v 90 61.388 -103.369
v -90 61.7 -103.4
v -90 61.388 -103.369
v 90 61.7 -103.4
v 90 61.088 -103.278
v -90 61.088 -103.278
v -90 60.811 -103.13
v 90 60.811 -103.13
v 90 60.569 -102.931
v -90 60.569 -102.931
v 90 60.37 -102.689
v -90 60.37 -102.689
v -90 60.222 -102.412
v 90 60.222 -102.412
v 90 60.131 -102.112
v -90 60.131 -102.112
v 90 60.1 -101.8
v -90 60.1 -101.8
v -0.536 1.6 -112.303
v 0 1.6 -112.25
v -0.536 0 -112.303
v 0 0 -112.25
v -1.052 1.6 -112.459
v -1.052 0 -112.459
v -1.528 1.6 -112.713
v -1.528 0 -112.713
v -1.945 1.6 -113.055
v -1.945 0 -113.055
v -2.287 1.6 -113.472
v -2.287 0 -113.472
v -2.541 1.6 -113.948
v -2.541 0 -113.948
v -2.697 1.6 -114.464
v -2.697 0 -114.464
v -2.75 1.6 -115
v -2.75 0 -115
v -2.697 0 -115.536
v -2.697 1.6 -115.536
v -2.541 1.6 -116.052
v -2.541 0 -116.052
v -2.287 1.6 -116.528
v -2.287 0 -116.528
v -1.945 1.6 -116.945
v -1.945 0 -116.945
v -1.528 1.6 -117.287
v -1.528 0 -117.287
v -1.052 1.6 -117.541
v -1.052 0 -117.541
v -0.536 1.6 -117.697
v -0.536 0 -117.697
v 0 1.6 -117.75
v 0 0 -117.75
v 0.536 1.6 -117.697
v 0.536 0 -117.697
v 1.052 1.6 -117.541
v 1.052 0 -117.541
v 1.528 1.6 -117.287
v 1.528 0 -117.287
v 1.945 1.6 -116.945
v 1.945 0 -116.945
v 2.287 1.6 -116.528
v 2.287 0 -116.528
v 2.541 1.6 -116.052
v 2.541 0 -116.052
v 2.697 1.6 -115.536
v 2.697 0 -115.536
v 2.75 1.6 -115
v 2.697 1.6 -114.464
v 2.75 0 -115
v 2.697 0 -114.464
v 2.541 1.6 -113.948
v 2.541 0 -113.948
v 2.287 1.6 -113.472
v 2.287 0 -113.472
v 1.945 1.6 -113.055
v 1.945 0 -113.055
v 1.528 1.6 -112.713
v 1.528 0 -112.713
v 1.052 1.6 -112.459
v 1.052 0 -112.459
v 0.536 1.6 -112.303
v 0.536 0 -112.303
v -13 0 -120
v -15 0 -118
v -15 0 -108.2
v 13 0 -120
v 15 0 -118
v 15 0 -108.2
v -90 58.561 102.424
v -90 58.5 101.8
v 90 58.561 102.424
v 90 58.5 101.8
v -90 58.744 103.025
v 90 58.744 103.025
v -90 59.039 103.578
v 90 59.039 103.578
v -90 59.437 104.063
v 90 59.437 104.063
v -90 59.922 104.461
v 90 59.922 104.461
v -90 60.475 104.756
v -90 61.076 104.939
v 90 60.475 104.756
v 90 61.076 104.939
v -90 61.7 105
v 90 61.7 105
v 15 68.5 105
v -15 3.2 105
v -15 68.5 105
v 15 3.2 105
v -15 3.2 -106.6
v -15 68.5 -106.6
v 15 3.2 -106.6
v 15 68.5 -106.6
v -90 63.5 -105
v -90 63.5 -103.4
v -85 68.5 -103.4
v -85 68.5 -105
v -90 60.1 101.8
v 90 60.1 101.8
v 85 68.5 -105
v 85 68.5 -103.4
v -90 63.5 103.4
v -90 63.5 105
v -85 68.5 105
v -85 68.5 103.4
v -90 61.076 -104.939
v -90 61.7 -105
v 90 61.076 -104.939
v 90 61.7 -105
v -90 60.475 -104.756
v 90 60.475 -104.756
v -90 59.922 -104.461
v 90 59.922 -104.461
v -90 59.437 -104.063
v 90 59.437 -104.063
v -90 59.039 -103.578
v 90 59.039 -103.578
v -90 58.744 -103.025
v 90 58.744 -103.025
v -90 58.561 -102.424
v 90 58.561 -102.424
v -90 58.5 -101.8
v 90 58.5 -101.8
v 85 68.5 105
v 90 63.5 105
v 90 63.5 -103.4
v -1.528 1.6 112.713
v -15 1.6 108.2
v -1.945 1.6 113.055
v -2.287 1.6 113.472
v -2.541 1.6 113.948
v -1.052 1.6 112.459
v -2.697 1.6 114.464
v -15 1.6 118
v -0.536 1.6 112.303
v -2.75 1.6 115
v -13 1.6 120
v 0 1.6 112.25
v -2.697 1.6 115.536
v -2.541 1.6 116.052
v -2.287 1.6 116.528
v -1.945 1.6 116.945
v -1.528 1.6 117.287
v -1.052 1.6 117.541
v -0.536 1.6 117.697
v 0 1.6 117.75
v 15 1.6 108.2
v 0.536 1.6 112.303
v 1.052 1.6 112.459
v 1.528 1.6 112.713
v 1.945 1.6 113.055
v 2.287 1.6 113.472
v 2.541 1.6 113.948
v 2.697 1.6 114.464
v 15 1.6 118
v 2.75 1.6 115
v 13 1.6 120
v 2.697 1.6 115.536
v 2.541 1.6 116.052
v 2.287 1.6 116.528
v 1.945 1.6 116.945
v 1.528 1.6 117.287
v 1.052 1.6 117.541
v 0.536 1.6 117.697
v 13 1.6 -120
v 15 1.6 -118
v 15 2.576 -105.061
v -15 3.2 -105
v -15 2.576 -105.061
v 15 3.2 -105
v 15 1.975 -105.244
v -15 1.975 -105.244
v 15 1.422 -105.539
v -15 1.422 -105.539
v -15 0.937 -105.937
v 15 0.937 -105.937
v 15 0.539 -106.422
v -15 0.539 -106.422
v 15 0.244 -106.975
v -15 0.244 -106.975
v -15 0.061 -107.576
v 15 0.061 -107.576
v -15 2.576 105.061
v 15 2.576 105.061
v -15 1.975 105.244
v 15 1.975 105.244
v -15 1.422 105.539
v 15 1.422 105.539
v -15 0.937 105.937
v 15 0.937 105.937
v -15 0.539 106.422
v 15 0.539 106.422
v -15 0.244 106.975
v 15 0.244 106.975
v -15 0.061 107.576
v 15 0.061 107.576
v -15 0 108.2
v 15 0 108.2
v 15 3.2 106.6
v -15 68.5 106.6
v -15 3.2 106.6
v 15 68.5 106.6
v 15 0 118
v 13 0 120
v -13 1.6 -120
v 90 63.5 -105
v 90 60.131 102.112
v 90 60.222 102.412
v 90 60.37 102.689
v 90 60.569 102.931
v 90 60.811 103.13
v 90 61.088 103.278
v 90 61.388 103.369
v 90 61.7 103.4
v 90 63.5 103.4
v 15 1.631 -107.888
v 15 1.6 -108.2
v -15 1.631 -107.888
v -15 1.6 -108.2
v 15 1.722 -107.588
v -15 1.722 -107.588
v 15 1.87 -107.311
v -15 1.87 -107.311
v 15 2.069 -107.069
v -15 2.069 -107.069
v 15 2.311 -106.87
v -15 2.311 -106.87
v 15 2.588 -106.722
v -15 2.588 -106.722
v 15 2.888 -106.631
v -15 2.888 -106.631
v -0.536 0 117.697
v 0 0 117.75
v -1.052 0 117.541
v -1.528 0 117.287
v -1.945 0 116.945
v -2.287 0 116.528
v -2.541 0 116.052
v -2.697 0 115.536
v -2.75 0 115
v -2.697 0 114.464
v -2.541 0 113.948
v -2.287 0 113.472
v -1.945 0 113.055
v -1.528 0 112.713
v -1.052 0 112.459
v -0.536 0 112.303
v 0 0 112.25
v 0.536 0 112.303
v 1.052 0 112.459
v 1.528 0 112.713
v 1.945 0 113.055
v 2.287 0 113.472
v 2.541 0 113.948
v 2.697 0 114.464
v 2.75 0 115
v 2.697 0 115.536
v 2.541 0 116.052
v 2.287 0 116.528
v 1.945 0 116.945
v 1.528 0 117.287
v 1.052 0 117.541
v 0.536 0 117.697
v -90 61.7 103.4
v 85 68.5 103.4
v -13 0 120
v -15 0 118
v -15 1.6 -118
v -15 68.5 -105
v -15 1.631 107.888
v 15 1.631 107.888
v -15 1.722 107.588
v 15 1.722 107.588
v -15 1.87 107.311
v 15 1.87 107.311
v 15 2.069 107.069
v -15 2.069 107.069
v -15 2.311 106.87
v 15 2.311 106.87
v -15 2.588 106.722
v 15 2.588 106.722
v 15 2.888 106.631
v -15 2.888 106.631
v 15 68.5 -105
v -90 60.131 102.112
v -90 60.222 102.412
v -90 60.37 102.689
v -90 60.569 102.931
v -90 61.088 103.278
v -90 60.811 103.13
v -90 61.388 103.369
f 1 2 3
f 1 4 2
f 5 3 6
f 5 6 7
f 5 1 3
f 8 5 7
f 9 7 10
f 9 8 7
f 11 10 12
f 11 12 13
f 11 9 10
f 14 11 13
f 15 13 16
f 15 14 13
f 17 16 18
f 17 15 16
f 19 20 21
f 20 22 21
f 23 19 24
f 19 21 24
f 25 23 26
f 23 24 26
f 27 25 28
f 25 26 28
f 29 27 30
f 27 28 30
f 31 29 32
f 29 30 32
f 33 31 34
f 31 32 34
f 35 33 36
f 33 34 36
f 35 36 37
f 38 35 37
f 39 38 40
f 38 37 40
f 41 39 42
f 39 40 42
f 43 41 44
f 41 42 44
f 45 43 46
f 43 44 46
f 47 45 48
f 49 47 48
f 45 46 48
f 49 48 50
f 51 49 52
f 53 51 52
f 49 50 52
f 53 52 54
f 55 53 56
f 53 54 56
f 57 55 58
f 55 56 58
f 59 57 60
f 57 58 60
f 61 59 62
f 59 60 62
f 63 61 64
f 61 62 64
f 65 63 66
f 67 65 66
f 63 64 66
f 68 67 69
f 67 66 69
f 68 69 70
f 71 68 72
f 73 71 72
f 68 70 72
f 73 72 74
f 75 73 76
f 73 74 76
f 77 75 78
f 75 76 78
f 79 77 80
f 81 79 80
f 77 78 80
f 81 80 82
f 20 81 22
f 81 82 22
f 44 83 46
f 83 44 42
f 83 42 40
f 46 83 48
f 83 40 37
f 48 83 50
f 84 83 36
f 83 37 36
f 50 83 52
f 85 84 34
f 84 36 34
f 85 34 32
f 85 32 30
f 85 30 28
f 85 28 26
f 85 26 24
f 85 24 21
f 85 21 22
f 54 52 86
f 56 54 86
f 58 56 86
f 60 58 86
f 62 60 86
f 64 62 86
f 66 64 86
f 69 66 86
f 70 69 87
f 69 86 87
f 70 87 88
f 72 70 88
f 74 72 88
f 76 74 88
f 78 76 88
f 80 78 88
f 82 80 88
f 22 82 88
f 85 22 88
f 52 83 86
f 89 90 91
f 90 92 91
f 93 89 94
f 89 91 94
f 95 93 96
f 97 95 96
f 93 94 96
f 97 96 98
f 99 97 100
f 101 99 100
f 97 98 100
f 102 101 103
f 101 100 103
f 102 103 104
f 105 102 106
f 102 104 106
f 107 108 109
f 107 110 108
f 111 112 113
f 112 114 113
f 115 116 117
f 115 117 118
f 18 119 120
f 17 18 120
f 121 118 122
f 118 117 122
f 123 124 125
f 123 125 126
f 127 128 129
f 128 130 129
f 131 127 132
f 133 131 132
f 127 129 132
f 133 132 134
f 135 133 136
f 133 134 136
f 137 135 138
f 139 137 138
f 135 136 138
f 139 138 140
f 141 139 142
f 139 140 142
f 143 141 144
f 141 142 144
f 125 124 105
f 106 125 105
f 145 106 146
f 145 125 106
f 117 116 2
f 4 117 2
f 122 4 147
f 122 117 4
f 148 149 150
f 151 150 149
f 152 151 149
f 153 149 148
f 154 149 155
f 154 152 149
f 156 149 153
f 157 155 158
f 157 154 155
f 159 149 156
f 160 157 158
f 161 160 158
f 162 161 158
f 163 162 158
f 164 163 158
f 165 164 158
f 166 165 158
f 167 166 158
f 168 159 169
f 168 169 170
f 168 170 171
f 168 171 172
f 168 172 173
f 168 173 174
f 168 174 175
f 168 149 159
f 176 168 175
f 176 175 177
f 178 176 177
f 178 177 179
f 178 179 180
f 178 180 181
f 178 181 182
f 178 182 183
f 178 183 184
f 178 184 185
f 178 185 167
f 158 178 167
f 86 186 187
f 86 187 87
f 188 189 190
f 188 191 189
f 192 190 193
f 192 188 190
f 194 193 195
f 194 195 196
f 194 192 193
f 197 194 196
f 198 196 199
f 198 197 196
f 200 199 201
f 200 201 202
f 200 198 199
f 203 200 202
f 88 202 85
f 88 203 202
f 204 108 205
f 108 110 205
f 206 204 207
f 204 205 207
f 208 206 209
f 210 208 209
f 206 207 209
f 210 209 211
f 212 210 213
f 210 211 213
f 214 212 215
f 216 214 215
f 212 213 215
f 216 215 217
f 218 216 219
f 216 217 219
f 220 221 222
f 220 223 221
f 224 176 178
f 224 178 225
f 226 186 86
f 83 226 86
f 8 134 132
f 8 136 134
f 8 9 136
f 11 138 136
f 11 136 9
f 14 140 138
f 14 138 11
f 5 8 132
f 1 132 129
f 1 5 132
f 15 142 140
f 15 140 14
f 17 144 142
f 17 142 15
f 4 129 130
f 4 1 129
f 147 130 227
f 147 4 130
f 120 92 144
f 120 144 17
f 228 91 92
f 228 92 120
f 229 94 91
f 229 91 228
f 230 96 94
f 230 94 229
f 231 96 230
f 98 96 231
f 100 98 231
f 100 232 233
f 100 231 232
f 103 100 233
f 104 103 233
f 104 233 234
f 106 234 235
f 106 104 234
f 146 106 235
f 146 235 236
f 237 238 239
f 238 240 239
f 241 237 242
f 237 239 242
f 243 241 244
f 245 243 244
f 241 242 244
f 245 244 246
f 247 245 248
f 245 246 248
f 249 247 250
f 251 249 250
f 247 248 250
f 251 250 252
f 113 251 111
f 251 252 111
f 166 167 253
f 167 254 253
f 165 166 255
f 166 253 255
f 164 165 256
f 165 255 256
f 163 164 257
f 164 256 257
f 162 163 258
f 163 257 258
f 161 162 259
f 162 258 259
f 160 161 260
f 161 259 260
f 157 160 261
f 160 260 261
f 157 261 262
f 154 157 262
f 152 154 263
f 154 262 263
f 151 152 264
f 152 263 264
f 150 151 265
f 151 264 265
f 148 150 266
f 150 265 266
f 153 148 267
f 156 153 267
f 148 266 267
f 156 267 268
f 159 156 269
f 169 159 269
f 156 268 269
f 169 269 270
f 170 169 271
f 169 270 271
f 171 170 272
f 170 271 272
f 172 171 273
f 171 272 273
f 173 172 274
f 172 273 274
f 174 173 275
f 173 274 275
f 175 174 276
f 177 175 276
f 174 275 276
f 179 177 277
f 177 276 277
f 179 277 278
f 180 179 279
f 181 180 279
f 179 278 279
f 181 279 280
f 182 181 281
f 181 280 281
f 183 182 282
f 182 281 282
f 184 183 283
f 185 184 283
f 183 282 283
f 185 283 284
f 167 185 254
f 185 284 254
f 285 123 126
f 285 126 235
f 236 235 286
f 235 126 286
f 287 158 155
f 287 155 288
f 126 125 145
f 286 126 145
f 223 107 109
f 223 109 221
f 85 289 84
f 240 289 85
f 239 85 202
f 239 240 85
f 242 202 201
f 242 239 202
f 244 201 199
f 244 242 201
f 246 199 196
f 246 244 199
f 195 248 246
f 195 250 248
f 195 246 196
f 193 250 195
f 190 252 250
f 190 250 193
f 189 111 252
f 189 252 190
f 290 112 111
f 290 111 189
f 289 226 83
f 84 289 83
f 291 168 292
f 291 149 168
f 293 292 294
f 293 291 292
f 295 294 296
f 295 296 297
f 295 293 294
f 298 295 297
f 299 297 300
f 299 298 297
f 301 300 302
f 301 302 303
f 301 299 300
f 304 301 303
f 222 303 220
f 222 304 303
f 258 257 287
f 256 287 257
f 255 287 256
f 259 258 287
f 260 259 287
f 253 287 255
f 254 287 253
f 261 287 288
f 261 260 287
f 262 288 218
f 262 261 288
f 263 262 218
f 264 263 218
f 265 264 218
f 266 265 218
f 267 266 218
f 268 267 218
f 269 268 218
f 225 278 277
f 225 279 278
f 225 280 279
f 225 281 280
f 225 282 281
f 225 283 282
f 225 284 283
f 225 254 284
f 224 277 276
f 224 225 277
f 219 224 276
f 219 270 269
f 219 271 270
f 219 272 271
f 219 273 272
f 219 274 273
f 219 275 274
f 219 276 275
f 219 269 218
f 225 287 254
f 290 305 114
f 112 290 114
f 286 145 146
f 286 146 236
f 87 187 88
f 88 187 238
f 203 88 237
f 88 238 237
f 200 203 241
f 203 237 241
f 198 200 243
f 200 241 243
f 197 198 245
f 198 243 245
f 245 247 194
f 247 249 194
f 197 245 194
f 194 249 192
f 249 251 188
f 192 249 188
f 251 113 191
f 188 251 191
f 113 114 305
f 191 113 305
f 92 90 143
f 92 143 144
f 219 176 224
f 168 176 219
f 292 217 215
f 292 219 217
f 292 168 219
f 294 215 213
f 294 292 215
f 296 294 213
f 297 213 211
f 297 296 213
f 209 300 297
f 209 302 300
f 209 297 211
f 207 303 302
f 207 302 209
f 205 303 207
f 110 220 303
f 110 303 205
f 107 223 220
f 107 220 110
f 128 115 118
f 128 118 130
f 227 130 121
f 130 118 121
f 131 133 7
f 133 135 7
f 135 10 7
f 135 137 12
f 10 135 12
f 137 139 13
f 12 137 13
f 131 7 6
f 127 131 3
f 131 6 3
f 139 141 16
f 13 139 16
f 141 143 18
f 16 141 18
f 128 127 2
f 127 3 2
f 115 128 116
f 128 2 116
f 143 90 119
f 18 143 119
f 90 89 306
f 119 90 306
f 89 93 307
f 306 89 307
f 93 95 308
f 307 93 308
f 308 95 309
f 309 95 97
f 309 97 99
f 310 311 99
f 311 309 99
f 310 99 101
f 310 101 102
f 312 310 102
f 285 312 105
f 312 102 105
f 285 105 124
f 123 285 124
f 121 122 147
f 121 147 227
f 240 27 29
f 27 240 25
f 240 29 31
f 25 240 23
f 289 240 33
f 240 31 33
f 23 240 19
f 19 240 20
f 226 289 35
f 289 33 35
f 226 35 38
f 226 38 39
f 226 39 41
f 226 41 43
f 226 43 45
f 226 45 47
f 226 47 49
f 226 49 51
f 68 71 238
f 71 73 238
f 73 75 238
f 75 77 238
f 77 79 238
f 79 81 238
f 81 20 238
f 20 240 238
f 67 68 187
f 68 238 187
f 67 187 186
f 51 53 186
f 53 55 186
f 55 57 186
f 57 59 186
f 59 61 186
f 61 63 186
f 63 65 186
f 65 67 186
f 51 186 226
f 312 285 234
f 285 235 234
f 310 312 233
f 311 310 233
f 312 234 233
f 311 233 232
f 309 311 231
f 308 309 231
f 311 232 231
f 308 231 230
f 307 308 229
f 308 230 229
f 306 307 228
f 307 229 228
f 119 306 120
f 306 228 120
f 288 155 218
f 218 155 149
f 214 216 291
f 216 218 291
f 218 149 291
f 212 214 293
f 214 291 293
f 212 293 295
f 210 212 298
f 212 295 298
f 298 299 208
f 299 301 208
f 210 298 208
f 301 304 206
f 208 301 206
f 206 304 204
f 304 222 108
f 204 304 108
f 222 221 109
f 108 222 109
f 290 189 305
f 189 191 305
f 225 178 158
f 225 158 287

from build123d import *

# Parameters (mm, degrees)
BOSS_EXTRUDE1_DEPTH           = 15
FILLET1_R                     = 1.6
FILLET2_R                     = 3.2
CHAMFER1_SIZE                 = 2
SKETCH2_W                     = 180
SKETCH2_H                     = 10
CUT_EXTRUDE1_DEPTH            = 105
SHELL1_T                      = -1.6
FILLET3_R                     = 1.6
FILLET4_R                     = 3.2
CHAMFER2_SIZE                 = 5
SKETCH4_W                     = 2.75
SKETCH4_H                     = 1.6
M5_CLEARANCE_HOLE1_AT_2_COUNT = 2
M5_CLEARANCE_HOLE1_AT_2_PITCH = 230


with BuildPart() as part:
    # Sketch1 → Boss-Extrude1 (new, symmetric)
    with BuildSketch(Plane(origin=(0, 0, 0), x_dir=(0, 0, -1), z_dir=(1, 0, 0))):
        Polygon((-120, 0), (-105, 0), (-105, 68.5), (-106.6, 68.5), (-106.6, 1.6), (-120, 1.6), align=None)
    extrude(amount=BOSS_EXTRUDE1_DEPTH, both=True)

    # Fillet1
    fillet1_edges = [part.edges().sort_by_distance(p)[0] for p in [
        (0, 1.6, 106.6),
    ]]
    fillet(fillet1_edges, radius=FILLET1_R)

    # Fillet2
    fillet2_edges = [part.edges().sort_by_distance(p)[0] for p in [
        (0, 0, 105),
    ]]
    fillet(fillet2_edges, radius=FILLET2_R)

    # Chamfer1
    chamfer1_edges = [part.edges().sort_by_distance(p)[0] for p in [
        (15, 0.8, 120),
        (-15, 0.8, 120),
    ]]
    chamfer(chamfer1_edges, length=CHAMFER1_SIZE)


with BuildPart() as body_2:
    # Sketch2 → Cut-Extrude1 (new, symmetric)
    with BuildSketch(Plane.XY):
        with Locations((0, 63.5)):
            Rectangle(SKETCH2_W, SKETCH2_H)
    extrude(amount=CUT_EXTRUDE1_DEPTH, both=True)

    # Shell1
    shell1_openings = [body_2.faces().sort_by_distance(p)[0] for p in [
        (0, 68.5, 0),
        (90, 63.5, 0),
        (-90, 63.5, 0),
    ]]
    offset(amount=SHELL1_T, openings=shell1_openings, kind=Kind.INTERSECTION)

    # Fillet3
    fillet3_edges = [body_2.edges().sort_by_distance(p)[0] for p in [
        (0, 60.1, -103.4),
        (0, 60.1, 103.4),
    ]]
    fillet(fillet3_edges, radius=FILLET3_R)

    # Fillet4
    fillet4_edges = [body_2.edges().sort_by_distance(p)[0] for p in [
        (0, 58.5, -105),
        (0, 58.5, 105),
    ]]
    fillet(fillet4_edges, radius=FILLET4_R)

    # Chamfer2
    chamfer2_edges = [body_2.edges().sort_by_distance(p)[0] for p in [
        (-90, 68.5, -104.2),
        (90, 68.5, -104.2),
        (-90, 68.5, 104.2),
        (90, 68.5, 104.2),
    ]]
    chamfer(chamfer2_edges, length=CHAMFER2_SIZE)


with BuildPart() as body_3:
    # MirrorSolid1: mirrored copy
    add(part.part.mirror(Plane.XY))


with BuildPart() as part_1:
    add(part.part)

    # Sketch4 → M5 Clearance Hole1 (revolve, cut)
    with BuildSketch(Plane(origin=(0, 1.6, 115), x_dir=(0, 0, 1), z_dir=(1, 0, 0))):
        with Locations((1.375, 0.8)):
            Rectangle(SKETCH4_W, SKETCH4_H)
    m5_clearance_hole1 = revolve(axis=Axis((0, 7.95, 115), (0, -1, 0)), mode=Mode.SUBTRACT)


with BuildPart() as body_3_1:
    add(body_3.part)

    # M5 Clearance Hole1 at 2: M5 Clearance Hole1 ×2
    with Locations(*[(0, 0, -i * M5_CLEARANCE_HOLE1_AT_2_PITCH) for i in range(1, M5_CLEARANCE_HOLE1_AT_2_COUNT)]):
        add(m5_clearance_hole1, mode=Mode.SUBTRACT)


solid = Compound([body_2.part, part_1.part, body_3_1.part])
